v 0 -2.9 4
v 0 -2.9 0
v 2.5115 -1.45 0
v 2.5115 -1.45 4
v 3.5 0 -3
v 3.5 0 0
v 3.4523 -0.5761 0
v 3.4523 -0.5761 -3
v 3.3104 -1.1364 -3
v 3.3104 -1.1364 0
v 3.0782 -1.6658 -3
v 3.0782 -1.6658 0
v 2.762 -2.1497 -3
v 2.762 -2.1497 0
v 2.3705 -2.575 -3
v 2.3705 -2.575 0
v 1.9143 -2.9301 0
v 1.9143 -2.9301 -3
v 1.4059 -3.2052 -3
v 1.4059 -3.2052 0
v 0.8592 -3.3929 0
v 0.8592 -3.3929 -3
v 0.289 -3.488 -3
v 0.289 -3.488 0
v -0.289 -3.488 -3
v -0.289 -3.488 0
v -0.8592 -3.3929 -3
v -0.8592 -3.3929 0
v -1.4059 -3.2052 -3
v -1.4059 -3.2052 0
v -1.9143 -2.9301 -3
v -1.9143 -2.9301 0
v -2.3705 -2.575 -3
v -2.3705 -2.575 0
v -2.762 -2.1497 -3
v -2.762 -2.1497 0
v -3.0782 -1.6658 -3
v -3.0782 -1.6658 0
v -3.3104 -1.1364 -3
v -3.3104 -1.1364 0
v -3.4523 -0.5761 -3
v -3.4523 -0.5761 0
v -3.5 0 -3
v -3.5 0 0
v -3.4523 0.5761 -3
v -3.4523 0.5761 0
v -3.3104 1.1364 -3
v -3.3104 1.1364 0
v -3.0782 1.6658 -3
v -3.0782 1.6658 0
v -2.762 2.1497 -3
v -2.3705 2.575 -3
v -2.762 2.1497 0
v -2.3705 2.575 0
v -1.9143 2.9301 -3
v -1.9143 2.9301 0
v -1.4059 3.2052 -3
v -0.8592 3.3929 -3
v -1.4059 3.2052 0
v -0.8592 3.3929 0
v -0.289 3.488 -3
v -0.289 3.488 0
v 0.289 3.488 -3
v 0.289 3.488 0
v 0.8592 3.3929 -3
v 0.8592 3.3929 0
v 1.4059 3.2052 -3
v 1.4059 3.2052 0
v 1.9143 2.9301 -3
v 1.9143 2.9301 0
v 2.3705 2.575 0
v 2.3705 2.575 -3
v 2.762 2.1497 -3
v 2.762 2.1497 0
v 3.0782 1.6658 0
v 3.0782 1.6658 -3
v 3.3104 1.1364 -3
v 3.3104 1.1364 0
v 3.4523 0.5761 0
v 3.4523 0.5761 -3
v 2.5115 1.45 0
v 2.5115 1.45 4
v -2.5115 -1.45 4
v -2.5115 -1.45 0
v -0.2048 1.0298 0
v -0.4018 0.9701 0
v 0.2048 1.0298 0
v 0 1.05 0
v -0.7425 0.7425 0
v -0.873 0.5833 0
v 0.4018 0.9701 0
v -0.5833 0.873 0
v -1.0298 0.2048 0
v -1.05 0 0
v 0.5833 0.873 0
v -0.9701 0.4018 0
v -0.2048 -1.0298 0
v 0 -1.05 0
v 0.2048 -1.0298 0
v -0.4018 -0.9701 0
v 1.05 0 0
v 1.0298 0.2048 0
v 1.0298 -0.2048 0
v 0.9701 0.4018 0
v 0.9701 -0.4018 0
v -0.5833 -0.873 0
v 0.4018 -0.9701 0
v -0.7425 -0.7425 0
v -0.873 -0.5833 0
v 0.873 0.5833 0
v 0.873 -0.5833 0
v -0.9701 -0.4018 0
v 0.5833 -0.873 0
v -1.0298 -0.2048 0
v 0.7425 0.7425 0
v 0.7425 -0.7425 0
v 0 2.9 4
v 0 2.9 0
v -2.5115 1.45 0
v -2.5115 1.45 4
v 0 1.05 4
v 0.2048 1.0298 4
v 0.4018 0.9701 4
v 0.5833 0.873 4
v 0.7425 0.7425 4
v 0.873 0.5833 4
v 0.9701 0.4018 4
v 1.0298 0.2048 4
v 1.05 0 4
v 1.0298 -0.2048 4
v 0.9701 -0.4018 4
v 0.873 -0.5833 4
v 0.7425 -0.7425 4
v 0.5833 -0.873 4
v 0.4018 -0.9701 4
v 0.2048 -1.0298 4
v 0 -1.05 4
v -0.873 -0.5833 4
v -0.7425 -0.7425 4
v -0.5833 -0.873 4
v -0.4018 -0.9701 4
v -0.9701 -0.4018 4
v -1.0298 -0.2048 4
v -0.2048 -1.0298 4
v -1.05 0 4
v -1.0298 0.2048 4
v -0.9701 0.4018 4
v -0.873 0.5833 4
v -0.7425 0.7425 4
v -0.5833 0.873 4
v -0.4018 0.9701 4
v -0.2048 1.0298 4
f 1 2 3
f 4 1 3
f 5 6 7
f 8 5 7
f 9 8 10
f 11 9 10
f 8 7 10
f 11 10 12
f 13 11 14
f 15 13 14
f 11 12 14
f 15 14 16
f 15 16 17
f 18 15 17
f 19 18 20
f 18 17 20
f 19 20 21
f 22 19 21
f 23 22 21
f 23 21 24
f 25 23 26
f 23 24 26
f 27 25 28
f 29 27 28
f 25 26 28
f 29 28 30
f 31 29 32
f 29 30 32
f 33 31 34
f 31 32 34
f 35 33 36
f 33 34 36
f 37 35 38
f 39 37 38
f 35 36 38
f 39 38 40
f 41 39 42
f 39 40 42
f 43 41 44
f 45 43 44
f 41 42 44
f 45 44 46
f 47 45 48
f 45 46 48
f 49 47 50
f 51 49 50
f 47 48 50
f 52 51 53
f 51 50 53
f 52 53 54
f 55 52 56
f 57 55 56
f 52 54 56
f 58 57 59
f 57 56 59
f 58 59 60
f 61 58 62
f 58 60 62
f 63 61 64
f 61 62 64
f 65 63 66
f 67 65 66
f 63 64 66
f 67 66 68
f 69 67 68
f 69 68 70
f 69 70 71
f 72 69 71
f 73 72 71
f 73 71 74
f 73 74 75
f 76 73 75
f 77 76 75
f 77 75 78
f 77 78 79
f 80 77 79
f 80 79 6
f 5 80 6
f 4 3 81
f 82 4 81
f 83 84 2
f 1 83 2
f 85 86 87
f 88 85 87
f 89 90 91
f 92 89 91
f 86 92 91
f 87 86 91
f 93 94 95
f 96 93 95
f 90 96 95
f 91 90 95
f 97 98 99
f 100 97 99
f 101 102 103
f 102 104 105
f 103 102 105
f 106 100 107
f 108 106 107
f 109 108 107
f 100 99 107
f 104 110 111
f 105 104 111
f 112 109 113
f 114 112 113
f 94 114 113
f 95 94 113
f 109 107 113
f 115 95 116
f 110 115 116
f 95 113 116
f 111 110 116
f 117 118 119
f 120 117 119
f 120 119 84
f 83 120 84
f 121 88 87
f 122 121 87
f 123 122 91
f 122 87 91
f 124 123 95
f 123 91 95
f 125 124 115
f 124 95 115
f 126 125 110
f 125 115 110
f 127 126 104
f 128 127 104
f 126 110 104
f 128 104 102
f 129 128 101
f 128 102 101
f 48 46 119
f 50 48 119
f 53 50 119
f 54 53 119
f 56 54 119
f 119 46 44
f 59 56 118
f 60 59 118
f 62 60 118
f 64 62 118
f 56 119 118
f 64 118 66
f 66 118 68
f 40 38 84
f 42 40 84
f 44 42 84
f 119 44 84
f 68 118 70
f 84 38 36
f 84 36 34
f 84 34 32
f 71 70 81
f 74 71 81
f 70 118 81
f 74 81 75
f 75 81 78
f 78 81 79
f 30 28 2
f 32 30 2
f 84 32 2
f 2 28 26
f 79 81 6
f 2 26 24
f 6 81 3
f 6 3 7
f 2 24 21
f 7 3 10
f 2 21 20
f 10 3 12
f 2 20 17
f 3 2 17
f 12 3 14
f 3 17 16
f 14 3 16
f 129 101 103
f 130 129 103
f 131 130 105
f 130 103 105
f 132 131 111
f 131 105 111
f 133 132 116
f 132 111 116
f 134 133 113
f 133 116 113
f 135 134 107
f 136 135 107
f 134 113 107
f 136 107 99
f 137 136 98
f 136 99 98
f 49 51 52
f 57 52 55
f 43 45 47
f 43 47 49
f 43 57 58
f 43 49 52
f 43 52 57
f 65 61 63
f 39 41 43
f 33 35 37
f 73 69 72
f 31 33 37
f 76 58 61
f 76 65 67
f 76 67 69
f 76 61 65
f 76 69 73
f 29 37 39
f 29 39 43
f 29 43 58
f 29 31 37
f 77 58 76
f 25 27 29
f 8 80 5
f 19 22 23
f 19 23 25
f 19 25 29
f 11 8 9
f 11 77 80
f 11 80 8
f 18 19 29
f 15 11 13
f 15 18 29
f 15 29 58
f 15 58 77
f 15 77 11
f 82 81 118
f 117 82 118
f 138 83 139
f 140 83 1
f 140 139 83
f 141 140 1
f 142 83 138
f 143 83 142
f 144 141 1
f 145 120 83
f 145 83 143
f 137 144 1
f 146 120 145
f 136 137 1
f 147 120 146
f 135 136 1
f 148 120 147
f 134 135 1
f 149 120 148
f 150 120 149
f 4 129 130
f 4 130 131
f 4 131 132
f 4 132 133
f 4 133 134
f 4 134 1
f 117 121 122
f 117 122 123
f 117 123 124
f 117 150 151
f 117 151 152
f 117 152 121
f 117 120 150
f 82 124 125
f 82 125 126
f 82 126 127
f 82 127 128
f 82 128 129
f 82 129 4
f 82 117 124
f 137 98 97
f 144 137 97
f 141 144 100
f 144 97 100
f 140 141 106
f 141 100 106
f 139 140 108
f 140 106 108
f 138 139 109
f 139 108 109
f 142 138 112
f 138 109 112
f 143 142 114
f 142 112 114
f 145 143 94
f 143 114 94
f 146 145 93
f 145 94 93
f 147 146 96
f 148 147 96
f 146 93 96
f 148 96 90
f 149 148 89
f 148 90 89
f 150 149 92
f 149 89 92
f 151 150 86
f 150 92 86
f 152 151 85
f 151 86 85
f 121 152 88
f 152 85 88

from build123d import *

# Parameters (mm, degrees)
F1_DEPTH = 4
F2_R     = 3.5
F2_R_2   = 1.05
F3_DEPTH = 3


with BuildPart() as f1:
    # F0 (on Top) → F1 (new body)
    with BuildSketch(Plane.XY):
        with BuildLine():
            Line((2.511473671, -1.45), (2.511473671, 1.45))
            Line((2.511473671, 1.45), (0, 2.9))
            Line((0, 2.9), (0, 1.05))
            ThreePointArc((0, 1.05), (0.7424621202, 0.7424621202), (1.05, 0))
            ThreePointArc((1.05, 0), (0.7424621202, -0.7424621202), (0, -1.05))
            Line((0, -1.05), (0, -2.9))
            Line((0, -2.9), (2.511473671, -1.45))
        make_face()
        with BuildLine():
            Line((0, 1.05), (0, 2.9))
            Line((0, 2.9), (-2.511473671, 1.45))
            Line((-2.511473671, 1.45), (-2.511473671, -1.45))
            Line((-2.511473671, -1.45), (0, -2.9))
            Line((0, -2.9), (0, -1.05))
            ThreePointArc((0, -1.05), (-1.05, 0), (0, 1.05))
        make_face()
    extrude(amount=F1_DEPTH)

    # F2 (on face) → F3 (join)
    with BuildSketch(Plane(origin=(0, 0, 0), x_dir=(1, 0, 0), z_dir=(0, 0, -1))):
        Circle(F2_R)
        Polygon((0, 2.9), (2.511473671, 1.45), (2.511473671, -1.45), (0, -2.9), (-2.511473671, -1.45), (-2.511473671, 1.45), align=None, mode=Mode.SUBTRACT)
        Polygon((2.511473671, -1.45), (2.511473671, 1.45), (0, 2.9), (-2.511473671, 1.45), (-2.511473671, -1.45), (0, -2.9), align=None)
        Circle(F2_R_2, mode=Mode.SUBTRACT)
        Circle(F2_R_2)
    extrude(amount=F3_DEPTH)


solid = f1.part
